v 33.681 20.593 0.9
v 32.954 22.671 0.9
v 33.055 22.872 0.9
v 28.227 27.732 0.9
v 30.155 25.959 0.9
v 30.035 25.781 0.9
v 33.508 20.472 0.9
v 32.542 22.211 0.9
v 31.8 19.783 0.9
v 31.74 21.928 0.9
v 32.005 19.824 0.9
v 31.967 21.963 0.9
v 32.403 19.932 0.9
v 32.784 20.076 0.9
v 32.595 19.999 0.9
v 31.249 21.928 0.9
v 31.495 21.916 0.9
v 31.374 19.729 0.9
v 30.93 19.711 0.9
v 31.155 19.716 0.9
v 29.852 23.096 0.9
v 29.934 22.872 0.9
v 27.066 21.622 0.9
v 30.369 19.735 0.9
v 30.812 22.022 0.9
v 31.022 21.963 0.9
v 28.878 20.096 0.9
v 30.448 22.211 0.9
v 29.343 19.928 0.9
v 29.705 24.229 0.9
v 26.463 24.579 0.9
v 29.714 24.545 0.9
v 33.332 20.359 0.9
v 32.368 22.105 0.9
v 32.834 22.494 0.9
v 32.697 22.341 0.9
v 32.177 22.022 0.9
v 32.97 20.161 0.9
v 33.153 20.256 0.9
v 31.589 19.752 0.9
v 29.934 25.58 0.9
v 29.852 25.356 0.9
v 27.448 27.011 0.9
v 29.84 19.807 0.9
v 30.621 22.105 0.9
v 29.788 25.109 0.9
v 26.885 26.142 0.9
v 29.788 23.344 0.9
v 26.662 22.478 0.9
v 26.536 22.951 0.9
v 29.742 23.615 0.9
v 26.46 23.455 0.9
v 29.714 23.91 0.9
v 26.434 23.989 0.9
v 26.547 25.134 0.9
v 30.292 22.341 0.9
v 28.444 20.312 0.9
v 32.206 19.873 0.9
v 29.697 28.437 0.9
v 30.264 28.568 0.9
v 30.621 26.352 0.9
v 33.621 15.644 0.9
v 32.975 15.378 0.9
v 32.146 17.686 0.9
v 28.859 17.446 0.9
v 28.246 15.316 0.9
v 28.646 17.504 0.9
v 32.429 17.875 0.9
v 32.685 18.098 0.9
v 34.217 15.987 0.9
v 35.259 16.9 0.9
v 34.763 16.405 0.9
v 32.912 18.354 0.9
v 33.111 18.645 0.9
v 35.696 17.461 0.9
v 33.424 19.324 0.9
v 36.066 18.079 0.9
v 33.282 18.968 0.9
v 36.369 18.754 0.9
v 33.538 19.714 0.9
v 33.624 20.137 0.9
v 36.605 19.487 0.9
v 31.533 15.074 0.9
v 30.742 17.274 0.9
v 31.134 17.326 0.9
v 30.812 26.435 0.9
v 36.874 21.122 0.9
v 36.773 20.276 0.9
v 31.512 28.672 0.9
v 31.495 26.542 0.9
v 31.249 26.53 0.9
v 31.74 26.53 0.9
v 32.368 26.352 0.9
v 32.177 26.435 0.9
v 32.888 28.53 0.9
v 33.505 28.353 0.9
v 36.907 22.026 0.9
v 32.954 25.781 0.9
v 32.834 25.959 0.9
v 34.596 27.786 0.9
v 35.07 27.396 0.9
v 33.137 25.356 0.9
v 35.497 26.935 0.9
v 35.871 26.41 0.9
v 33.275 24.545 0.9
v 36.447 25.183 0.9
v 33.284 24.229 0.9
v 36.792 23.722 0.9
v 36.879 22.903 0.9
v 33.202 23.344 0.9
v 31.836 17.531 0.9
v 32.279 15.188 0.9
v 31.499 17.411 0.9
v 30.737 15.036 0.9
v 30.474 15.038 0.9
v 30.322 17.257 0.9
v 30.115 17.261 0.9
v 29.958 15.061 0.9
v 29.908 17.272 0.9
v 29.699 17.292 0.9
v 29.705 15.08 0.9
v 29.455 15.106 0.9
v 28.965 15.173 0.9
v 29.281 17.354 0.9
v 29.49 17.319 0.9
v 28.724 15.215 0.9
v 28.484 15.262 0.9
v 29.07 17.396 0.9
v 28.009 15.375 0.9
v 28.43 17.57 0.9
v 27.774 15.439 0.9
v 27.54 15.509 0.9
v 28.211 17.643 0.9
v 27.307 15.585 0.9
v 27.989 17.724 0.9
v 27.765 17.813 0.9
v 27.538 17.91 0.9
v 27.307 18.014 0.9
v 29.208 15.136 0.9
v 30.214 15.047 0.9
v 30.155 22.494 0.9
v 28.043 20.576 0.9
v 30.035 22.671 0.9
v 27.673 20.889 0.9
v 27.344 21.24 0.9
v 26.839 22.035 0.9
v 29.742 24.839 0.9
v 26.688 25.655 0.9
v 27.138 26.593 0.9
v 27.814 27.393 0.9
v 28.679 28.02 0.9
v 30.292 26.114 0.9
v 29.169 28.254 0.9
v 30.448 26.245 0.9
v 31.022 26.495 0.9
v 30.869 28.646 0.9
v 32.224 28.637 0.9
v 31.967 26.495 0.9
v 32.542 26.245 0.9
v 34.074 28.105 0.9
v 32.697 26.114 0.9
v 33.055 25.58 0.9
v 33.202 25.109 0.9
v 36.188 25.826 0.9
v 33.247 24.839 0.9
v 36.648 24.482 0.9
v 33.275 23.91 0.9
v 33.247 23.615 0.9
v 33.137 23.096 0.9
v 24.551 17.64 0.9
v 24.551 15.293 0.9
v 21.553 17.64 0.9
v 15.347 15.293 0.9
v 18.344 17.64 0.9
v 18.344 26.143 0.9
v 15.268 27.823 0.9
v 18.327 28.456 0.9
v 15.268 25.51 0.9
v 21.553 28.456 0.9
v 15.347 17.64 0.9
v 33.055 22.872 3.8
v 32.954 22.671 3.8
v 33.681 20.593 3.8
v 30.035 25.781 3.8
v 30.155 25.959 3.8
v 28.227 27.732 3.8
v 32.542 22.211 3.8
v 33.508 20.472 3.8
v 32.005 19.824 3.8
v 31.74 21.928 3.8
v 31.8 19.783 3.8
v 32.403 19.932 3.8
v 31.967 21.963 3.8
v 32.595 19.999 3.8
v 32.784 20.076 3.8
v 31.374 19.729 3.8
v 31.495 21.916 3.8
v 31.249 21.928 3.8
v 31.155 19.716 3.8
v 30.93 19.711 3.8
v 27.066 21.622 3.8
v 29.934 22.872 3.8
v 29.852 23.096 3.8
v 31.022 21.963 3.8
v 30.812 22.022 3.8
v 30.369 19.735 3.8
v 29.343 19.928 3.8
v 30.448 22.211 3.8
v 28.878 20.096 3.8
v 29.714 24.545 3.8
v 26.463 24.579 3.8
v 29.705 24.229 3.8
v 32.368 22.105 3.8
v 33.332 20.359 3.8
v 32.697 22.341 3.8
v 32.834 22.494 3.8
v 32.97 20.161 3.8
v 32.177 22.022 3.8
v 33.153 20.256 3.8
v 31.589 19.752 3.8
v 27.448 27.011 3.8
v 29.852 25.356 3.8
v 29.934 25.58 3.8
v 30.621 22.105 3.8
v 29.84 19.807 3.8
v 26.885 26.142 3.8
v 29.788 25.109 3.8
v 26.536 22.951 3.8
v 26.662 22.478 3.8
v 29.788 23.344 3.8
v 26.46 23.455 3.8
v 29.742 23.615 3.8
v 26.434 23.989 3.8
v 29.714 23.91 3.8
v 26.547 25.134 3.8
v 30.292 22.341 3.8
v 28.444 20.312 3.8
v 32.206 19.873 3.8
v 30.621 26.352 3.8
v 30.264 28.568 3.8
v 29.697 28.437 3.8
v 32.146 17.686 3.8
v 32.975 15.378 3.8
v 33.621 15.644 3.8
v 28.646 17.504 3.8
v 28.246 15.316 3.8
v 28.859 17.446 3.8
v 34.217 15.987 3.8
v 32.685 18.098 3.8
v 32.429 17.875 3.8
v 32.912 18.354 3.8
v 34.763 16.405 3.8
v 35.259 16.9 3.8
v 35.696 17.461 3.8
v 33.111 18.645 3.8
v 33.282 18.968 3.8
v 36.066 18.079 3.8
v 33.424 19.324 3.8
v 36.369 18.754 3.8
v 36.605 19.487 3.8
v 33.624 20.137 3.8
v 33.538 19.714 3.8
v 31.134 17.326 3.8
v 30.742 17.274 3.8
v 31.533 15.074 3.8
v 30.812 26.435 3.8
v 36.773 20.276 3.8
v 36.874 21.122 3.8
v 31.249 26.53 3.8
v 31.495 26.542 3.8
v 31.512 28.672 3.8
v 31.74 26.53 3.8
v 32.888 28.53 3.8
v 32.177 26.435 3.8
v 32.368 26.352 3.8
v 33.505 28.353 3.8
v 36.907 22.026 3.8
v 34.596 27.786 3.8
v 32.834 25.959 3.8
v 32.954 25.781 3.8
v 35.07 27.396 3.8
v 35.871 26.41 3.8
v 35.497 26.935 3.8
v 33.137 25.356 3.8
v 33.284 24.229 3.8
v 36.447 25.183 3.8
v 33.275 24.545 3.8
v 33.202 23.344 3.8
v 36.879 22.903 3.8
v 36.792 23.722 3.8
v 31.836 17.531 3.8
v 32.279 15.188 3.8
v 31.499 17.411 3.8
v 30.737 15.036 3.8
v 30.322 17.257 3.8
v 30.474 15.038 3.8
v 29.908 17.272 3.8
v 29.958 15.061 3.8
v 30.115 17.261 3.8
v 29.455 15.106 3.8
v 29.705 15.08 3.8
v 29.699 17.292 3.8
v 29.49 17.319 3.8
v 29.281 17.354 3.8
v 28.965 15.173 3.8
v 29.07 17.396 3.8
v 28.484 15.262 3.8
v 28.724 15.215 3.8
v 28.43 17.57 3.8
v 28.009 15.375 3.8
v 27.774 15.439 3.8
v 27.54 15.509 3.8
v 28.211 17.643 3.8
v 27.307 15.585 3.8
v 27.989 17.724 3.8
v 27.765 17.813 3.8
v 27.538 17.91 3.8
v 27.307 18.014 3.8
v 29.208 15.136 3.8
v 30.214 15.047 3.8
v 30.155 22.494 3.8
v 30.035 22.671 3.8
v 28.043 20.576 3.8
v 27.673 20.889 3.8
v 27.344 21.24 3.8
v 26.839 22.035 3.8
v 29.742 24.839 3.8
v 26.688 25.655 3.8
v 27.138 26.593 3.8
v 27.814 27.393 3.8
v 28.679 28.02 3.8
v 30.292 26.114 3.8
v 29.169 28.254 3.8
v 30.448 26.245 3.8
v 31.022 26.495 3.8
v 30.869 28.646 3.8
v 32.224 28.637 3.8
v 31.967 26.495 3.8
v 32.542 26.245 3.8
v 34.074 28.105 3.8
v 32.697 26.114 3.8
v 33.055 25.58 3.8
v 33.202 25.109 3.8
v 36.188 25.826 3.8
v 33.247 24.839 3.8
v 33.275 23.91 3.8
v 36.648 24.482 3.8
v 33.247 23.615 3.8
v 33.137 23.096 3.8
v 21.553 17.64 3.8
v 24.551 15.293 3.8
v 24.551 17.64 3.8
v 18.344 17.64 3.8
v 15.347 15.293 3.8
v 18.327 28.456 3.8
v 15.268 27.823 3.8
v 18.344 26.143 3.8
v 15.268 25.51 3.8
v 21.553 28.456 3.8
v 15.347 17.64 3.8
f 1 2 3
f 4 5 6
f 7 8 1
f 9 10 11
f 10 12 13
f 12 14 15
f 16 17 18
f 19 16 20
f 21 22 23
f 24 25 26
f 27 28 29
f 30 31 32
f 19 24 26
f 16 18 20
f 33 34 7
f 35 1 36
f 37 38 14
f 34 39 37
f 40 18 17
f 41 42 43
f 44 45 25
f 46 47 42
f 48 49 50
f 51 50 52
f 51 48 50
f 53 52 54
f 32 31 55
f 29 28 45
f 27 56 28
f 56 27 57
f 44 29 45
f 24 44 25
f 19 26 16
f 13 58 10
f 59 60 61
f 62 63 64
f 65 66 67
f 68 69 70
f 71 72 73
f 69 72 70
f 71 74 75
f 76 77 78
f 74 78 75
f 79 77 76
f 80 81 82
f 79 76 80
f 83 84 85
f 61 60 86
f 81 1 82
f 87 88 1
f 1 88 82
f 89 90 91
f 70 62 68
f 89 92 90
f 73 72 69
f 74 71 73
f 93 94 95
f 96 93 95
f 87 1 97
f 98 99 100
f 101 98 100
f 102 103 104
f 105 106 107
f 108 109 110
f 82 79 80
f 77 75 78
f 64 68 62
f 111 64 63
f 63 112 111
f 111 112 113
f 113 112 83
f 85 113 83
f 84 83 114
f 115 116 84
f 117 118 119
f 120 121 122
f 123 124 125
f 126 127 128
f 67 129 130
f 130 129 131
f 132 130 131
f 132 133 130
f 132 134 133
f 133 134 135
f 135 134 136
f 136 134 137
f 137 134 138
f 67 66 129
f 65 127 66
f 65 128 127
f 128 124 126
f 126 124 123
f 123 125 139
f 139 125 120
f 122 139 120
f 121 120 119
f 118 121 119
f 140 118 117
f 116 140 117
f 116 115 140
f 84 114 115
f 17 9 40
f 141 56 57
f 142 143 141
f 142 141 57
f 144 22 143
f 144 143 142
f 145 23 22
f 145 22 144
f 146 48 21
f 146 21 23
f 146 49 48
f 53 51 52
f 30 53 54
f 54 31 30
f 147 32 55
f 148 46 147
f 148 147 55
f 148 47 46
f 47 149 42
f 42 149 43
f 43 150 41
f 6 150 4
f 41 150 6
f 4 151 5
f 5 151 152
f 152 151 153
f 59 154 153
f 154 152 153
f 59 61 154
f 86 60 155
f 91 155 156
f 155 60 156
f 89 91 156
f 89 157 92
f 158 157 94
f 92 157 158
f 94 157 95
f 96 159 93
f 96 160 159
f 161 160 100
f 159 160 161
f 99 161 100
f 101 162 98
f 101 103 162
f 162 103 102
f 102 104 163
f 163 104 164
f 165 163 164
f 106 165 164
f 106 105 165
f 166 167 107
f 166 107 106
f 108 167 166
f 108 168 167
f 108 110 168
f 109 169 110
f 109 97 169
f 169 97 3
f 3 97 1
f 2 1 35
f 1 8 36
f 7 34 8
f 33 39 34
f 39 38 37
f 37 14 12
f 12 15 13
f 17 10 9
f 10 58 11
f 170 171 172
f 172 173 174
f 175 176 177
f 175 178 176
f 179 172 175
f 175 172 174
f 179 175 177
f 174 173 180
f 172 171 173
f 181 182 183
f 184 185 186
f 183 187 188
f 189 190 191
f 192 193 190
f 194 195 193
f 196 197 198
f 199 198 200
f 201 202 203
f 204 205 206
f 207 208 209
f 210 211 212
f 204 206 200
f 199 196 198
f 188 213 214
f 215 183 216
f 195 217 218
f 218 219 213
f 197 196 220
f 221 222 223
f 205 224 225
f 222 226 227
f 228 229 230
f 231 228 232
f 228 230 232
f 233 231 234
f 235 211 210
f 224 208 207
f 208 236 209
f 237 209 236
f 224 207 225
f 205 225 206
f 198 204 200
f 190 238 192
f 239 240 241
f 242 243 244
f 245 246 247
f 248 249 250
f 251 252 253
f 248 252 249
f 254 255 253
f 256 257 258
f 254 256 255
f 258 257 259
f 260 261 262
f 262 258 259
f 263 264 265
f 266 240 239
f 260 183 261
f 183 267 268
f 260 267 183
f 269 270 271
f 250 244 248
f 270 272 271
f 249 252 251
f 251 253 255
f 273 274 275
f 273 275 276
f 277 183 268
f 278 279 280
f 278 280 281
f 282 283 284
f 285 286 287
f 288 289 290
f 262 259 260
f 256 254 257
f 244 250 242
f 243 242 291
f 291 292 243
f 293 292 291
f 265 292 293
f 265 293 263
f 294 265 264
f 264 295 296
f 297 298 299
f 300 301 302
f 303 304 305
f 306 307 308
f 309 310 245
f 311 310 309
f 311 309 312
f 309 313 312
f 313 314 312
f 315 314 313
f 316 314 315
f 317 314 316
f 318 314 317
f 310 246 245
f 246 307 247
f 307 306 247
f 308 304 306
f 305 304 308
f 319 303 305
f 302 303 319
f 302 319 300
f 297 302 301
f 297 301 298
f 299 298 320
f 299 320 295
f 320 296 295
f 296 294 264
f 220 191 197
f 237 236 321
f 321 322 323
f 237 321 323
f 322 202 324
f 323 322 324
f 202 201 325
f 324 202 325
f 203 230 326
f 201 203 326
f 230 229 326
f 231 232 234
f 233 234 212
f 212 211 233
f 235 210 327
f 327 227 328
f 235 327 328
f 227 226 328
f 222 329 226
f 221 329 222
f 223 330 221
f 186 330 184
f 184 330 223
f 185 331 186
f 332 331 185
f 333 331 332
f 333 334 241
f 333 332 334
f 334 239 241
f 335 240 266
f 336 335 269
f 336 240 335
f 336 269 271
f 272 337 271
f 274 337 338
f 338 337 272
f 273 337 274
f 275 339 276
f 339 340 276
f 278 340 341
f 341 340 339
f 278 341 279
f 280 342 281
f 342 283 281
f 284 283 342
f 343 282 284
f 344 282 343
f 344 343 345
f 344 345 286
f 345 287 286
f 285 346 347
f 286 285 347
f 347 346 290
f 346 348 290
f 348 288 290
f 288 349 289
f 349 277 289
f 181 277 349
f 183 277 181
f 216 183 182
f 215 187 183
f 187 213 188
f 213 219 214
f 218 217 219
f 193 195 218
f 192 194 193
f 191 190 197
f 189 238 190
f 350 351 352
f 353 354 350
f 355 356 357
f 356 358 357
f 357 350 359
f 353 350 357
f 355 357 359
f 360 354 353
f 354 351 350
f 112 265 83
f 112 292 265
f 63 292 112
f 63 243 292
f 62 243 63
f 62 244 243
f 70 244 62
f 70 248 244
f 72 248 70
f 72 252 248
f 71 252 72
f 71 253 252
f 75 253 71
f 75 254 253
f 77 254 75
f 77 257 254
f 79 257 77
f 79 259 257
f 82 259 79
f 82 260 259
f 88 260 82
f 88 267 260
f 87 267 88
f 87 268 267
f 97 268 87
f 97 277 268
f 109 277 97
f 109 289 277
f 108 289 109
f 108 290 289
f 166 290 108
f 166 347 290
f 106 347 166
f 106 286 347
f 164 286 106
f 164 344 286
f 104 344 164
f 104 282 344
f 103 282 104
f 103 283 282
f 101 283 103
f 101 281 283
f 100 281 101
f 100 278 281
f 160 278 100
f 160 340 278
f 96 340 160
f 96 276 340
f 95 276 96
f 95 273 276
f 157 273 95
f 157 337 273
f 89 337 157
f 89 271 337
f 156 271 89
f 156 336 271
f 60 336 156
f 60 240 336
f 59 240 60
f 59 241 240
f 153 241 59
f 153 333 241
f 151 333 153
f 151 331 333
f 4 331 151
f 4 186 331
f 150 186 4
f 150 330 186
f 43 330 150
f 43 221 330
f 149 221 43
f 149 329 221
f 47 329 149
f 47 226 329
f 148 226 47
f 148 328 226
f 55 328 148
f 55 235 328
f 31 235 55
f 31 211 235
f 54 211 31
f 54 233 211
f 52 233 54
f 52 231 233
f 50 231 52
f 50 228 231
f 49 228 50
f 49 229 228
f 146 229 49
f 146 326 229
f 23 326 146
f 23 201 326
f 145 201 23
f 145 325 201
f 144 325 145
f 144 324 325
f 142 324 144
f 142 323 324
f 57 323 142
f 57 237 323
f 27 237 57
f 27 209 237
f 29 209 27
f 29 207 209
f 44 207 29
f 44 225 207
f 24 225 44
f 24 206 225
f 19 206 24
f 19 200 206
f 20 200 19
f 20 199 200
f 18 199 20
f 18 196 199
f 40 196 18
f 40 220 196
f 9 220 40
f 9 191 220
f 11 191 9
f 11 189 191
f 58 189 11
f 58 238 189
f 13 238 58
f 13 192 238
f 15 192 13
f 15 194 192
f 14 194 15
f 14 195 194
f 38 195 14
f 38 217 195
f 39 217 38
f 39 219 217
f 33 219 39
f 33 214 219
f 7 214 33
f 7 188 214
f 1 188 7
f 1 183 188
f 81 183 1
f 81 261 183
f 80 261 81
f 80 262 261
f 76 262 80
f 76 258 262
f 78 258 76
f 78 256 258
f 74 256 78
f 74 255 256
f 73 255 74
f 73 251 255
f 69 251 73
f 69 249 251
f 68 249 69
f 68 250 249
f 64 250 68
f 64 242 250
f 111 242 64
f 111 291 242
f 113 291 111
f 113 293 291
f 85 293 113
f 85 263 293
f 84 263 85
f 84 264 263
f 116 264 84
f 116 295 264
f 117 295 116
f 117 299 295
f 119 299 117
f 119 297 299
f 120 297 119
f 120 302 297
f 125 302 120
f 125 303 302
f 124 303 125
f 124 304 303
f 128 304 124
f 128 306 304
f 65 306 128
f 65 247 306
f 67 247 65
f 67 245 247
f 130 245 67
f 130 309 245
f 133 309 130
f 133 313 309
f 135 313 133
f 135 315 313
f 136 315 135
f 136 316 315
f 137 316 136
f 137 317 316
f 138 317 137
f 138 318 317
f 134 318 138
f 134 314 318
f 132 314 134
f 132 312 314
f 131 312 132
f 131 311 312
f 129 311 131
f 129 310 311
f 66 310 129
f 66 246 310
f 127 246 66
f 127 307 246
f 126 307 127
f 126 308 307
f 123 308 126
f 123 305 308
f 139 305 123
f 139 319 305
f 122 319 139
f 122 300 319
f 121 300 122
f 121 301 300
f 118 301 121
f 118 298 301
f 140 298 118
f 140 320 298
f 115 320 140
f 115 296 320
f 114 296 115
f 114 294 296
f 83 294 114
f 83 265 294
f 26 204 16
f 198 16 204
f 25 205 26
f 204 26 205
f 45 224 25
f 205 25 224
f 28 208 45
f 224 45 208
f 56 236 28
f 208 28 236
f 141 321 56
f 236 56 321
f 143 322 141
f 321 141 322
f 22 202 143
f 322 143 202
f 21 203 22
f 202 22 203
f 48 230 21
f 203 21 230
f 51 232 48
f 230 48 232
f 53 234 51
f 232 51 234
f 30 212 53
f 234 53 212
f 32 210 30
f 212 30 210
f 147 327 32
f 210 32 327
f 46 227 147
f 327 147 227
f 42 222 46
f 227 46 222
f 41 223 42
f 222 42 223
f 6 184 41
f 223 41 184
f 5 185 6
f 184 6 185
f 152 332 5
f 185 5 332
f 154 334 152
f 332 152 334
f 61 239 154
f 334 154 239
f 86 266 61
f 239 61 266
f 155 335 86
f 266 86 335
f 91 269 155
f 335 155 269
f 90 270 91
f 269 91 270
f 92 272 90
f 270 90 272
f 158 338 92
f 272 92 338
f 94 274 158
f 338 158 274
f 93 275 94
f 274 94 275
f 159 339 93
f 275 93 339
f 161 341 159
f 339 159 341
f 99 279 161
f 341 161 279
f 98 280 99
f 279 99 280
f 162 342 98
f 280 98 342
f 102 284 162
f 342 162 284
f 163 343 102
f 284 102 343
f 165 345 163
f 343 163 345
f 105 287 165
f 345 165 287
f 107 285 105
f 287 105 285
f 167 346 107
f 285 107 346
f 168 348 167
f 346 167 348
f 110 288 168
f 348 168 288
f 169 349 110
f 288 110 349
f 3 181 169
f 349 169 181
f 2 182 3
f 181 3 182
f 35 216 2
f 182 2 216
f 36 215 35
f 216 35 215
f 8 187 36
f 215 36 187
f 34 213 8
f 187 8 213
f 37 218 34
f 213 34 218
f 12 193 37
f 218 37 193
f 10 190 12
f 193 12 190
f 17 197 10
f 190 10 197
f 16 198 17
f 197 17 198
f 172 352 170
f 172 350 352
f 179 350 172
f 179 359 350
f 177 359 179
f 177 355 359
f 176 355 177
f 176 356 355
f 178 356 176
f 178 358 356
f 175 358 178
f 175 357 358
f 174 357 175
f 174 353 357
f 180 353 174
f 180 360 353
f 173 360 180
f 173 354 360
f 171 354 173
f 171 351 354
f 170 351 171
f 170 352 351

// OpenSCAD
$fn = 48;
  translate([25.500, 21.700, 0.900])
    linear_extrude(height=2.900)
      text("19", size=13.000, halign="center", valign="center", font="Helvetica Neue:style=Bold");
